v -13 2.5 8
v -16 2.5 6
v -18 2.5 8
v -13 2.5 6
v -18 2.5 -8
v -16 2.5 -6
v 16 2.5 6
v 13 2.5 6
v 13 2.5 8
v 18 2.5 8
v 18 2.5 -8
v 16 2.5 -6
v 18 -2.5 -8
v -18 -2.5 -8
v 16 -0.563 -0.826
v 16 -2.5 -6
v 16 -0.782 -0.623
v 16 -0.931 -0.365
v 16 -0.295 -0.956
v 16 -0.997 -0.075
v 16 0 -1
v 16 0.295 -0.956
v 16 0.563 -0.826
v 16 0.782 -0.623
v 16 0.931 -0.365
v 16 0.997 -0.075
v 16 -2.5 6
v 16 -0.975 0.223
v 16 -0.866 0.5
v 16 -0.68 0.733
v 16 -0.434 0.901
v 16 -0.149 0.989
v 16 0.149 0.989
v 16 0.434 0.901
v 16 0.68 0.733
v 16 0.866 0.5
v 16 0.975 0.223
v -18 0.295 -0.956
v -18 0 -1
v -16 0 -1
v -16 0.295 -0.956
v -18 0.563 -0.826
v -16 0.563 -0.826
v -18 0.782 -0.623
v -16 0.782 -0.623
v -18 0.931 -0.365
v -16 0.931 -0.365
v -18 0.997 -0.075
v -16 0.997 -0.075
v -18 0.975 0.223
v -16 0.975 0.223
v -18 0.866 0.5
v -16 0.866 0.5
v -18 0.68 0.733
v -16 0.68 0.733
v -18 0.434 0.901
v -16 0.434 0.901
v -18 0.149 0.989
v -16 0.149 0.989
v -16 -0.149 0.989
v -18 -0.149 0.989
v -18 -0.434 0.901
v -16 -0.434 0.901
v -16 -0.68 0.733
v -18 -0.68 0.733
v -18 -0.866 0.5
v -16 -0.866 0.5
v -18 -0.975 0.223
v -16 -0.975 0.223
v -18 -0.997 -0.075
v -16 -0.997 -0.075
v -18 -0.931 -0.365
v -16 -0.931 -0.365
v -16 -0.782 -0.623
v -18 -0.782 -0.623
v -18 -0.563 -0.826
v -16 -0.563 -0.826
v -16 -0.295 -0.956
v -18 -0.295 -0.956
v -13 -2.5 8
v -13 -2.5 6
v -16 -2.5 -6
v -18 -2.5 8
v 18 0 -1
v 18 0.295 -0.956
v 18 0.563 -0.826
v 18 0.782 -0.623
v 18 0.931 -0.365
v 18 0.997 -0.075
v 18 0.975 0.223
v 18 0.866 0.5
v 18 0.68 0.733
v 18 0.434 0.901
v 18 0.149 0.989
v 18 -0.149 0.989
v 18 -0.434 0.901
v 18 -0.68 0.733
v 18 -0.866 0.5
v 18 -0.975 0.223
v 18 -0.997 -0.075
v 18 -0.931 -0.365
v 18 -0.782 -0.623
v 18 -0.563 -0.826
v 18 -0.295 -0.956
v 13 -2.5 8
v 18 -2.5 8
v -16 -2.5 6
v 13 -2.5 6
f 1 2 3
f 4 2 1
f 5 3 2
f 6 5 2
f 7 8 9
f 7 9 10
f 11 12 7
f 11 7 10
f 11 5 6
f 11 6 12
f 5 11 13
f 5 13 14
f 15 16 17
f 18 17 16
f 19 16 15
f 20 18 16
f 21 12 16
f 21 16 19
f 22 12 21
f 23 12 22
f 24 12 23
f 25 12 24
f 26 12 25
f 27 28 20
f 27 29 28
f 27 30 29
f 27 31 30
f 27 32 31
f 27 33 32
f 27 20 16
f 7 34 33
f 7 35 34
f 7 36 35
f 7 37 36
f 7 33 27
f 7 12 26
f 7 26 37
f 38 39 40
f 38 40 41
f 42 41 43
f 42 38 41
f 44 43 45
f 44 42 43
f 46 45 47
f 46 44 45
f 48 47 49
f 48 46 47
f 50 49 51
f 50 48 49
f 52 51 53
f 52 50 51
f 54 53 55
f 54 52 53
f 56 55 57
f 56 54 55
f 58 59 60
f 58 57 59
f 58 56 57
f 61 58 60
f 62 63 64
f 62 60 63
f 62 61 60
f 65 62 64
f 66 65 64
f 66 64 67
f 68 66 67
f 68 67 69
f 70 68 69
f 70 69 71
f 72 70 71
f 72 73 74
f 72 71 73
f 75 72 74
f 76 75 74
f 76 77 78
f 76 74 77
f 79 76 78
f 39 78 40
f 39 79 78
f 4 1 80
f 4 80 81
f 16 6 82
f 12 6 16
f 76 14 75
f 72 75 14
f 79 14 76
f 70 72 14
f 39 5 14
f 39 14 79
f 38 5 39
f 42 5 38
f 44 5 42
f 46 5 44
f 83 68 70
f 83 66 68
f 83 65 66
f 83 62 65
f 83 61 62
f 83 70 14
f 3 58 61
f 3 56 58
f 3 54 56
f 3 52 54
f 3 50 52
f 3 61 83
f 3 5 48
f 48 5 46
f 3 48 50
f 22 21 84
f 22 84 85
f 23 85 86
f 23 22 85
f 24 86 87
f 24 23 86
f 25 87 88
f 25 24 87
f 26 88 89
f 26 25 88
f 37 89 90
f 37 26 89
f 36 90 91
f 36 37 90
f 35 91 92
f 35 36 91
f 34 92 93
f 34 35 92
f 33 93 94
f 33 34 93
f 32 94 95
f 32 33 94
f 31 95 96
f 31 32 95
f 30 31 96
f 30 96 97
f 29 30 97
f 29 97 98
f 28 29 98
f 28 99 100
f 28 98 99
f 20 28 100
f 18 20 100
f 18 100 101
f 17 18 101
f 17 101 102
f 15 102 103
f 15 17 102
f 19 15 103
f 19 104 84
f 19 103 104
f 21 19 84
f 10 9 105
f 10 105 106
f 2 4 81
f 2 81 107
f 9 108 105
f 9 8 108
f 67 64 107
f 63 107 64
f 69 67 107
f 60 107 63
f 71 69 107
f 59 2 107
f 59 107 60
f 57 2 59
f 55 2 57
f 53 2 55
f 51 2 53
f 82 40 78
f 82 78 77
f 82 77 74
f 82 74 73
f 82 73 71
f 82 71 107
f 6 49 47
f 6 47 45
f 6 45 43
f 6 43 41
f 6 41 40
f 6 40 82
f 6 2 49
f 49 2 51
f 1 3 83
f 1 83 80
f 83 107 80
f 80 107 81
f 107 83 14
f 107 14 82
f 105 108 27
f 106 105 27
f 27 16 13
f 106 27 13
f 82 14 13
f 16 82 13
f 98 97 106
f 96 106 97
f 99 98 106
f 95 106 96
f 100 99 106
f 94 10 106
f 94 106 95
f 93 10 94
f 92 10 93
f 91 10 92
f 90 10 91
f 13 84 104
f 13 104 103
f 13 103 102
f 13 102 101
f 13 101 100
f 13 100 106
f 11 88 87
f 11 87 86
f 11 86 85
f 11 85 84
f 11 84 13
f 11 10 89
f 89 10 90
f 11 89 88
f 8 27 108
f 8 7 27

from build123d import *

# Parameters (mm, degrees)
BOSS_EXTRUDE1_DEPTH     = 2.5
CUT_EXTRUDE1_DEPTH      = 37.962819157
CUT_EXTRUDE1_DEPTH_BACK = 37.962819157
SKETCH2_R               = 1


with BuildPart() as part:
    # Sketch1 → Boss-Extrude1 (new, symmetric)
    with BuildSketch(Plane(origin=(0, 0, 0), x_dir=(1, 0, 0), z_dir=(0, 1, 0))):
        Polygon((13, -6), (13, -8), (18, -8), (18, 8), (-18, 8), (-18, -8), (-13, -8), (-13, -6), (-16, -6), (-16, 6), (16, 6), (16, -6), align=None)
    extrude(amount=BOSS_EXTRUDE1_DEPTH, both=True)

    # Sketch2 → Cut-Extrude1 (cut, two sides: drawn at the far end of the back side and taken through both)
    with BuildSketch(Plane(origin=(18, 0, 0), x_dir=(0, 0, -1), z_dir=(1, 0, 0)).offset(-CUT_EXTRUDE1_DEPTH_BACK)):
        Circle(SKETCH2_R)
    extrude(amount=CUT_EXTRUDE1_DEPTH + CUT_EXTRUDE1_DEPTH_BACK, mode=Mode.SUBTRACT)


solid = part.part
